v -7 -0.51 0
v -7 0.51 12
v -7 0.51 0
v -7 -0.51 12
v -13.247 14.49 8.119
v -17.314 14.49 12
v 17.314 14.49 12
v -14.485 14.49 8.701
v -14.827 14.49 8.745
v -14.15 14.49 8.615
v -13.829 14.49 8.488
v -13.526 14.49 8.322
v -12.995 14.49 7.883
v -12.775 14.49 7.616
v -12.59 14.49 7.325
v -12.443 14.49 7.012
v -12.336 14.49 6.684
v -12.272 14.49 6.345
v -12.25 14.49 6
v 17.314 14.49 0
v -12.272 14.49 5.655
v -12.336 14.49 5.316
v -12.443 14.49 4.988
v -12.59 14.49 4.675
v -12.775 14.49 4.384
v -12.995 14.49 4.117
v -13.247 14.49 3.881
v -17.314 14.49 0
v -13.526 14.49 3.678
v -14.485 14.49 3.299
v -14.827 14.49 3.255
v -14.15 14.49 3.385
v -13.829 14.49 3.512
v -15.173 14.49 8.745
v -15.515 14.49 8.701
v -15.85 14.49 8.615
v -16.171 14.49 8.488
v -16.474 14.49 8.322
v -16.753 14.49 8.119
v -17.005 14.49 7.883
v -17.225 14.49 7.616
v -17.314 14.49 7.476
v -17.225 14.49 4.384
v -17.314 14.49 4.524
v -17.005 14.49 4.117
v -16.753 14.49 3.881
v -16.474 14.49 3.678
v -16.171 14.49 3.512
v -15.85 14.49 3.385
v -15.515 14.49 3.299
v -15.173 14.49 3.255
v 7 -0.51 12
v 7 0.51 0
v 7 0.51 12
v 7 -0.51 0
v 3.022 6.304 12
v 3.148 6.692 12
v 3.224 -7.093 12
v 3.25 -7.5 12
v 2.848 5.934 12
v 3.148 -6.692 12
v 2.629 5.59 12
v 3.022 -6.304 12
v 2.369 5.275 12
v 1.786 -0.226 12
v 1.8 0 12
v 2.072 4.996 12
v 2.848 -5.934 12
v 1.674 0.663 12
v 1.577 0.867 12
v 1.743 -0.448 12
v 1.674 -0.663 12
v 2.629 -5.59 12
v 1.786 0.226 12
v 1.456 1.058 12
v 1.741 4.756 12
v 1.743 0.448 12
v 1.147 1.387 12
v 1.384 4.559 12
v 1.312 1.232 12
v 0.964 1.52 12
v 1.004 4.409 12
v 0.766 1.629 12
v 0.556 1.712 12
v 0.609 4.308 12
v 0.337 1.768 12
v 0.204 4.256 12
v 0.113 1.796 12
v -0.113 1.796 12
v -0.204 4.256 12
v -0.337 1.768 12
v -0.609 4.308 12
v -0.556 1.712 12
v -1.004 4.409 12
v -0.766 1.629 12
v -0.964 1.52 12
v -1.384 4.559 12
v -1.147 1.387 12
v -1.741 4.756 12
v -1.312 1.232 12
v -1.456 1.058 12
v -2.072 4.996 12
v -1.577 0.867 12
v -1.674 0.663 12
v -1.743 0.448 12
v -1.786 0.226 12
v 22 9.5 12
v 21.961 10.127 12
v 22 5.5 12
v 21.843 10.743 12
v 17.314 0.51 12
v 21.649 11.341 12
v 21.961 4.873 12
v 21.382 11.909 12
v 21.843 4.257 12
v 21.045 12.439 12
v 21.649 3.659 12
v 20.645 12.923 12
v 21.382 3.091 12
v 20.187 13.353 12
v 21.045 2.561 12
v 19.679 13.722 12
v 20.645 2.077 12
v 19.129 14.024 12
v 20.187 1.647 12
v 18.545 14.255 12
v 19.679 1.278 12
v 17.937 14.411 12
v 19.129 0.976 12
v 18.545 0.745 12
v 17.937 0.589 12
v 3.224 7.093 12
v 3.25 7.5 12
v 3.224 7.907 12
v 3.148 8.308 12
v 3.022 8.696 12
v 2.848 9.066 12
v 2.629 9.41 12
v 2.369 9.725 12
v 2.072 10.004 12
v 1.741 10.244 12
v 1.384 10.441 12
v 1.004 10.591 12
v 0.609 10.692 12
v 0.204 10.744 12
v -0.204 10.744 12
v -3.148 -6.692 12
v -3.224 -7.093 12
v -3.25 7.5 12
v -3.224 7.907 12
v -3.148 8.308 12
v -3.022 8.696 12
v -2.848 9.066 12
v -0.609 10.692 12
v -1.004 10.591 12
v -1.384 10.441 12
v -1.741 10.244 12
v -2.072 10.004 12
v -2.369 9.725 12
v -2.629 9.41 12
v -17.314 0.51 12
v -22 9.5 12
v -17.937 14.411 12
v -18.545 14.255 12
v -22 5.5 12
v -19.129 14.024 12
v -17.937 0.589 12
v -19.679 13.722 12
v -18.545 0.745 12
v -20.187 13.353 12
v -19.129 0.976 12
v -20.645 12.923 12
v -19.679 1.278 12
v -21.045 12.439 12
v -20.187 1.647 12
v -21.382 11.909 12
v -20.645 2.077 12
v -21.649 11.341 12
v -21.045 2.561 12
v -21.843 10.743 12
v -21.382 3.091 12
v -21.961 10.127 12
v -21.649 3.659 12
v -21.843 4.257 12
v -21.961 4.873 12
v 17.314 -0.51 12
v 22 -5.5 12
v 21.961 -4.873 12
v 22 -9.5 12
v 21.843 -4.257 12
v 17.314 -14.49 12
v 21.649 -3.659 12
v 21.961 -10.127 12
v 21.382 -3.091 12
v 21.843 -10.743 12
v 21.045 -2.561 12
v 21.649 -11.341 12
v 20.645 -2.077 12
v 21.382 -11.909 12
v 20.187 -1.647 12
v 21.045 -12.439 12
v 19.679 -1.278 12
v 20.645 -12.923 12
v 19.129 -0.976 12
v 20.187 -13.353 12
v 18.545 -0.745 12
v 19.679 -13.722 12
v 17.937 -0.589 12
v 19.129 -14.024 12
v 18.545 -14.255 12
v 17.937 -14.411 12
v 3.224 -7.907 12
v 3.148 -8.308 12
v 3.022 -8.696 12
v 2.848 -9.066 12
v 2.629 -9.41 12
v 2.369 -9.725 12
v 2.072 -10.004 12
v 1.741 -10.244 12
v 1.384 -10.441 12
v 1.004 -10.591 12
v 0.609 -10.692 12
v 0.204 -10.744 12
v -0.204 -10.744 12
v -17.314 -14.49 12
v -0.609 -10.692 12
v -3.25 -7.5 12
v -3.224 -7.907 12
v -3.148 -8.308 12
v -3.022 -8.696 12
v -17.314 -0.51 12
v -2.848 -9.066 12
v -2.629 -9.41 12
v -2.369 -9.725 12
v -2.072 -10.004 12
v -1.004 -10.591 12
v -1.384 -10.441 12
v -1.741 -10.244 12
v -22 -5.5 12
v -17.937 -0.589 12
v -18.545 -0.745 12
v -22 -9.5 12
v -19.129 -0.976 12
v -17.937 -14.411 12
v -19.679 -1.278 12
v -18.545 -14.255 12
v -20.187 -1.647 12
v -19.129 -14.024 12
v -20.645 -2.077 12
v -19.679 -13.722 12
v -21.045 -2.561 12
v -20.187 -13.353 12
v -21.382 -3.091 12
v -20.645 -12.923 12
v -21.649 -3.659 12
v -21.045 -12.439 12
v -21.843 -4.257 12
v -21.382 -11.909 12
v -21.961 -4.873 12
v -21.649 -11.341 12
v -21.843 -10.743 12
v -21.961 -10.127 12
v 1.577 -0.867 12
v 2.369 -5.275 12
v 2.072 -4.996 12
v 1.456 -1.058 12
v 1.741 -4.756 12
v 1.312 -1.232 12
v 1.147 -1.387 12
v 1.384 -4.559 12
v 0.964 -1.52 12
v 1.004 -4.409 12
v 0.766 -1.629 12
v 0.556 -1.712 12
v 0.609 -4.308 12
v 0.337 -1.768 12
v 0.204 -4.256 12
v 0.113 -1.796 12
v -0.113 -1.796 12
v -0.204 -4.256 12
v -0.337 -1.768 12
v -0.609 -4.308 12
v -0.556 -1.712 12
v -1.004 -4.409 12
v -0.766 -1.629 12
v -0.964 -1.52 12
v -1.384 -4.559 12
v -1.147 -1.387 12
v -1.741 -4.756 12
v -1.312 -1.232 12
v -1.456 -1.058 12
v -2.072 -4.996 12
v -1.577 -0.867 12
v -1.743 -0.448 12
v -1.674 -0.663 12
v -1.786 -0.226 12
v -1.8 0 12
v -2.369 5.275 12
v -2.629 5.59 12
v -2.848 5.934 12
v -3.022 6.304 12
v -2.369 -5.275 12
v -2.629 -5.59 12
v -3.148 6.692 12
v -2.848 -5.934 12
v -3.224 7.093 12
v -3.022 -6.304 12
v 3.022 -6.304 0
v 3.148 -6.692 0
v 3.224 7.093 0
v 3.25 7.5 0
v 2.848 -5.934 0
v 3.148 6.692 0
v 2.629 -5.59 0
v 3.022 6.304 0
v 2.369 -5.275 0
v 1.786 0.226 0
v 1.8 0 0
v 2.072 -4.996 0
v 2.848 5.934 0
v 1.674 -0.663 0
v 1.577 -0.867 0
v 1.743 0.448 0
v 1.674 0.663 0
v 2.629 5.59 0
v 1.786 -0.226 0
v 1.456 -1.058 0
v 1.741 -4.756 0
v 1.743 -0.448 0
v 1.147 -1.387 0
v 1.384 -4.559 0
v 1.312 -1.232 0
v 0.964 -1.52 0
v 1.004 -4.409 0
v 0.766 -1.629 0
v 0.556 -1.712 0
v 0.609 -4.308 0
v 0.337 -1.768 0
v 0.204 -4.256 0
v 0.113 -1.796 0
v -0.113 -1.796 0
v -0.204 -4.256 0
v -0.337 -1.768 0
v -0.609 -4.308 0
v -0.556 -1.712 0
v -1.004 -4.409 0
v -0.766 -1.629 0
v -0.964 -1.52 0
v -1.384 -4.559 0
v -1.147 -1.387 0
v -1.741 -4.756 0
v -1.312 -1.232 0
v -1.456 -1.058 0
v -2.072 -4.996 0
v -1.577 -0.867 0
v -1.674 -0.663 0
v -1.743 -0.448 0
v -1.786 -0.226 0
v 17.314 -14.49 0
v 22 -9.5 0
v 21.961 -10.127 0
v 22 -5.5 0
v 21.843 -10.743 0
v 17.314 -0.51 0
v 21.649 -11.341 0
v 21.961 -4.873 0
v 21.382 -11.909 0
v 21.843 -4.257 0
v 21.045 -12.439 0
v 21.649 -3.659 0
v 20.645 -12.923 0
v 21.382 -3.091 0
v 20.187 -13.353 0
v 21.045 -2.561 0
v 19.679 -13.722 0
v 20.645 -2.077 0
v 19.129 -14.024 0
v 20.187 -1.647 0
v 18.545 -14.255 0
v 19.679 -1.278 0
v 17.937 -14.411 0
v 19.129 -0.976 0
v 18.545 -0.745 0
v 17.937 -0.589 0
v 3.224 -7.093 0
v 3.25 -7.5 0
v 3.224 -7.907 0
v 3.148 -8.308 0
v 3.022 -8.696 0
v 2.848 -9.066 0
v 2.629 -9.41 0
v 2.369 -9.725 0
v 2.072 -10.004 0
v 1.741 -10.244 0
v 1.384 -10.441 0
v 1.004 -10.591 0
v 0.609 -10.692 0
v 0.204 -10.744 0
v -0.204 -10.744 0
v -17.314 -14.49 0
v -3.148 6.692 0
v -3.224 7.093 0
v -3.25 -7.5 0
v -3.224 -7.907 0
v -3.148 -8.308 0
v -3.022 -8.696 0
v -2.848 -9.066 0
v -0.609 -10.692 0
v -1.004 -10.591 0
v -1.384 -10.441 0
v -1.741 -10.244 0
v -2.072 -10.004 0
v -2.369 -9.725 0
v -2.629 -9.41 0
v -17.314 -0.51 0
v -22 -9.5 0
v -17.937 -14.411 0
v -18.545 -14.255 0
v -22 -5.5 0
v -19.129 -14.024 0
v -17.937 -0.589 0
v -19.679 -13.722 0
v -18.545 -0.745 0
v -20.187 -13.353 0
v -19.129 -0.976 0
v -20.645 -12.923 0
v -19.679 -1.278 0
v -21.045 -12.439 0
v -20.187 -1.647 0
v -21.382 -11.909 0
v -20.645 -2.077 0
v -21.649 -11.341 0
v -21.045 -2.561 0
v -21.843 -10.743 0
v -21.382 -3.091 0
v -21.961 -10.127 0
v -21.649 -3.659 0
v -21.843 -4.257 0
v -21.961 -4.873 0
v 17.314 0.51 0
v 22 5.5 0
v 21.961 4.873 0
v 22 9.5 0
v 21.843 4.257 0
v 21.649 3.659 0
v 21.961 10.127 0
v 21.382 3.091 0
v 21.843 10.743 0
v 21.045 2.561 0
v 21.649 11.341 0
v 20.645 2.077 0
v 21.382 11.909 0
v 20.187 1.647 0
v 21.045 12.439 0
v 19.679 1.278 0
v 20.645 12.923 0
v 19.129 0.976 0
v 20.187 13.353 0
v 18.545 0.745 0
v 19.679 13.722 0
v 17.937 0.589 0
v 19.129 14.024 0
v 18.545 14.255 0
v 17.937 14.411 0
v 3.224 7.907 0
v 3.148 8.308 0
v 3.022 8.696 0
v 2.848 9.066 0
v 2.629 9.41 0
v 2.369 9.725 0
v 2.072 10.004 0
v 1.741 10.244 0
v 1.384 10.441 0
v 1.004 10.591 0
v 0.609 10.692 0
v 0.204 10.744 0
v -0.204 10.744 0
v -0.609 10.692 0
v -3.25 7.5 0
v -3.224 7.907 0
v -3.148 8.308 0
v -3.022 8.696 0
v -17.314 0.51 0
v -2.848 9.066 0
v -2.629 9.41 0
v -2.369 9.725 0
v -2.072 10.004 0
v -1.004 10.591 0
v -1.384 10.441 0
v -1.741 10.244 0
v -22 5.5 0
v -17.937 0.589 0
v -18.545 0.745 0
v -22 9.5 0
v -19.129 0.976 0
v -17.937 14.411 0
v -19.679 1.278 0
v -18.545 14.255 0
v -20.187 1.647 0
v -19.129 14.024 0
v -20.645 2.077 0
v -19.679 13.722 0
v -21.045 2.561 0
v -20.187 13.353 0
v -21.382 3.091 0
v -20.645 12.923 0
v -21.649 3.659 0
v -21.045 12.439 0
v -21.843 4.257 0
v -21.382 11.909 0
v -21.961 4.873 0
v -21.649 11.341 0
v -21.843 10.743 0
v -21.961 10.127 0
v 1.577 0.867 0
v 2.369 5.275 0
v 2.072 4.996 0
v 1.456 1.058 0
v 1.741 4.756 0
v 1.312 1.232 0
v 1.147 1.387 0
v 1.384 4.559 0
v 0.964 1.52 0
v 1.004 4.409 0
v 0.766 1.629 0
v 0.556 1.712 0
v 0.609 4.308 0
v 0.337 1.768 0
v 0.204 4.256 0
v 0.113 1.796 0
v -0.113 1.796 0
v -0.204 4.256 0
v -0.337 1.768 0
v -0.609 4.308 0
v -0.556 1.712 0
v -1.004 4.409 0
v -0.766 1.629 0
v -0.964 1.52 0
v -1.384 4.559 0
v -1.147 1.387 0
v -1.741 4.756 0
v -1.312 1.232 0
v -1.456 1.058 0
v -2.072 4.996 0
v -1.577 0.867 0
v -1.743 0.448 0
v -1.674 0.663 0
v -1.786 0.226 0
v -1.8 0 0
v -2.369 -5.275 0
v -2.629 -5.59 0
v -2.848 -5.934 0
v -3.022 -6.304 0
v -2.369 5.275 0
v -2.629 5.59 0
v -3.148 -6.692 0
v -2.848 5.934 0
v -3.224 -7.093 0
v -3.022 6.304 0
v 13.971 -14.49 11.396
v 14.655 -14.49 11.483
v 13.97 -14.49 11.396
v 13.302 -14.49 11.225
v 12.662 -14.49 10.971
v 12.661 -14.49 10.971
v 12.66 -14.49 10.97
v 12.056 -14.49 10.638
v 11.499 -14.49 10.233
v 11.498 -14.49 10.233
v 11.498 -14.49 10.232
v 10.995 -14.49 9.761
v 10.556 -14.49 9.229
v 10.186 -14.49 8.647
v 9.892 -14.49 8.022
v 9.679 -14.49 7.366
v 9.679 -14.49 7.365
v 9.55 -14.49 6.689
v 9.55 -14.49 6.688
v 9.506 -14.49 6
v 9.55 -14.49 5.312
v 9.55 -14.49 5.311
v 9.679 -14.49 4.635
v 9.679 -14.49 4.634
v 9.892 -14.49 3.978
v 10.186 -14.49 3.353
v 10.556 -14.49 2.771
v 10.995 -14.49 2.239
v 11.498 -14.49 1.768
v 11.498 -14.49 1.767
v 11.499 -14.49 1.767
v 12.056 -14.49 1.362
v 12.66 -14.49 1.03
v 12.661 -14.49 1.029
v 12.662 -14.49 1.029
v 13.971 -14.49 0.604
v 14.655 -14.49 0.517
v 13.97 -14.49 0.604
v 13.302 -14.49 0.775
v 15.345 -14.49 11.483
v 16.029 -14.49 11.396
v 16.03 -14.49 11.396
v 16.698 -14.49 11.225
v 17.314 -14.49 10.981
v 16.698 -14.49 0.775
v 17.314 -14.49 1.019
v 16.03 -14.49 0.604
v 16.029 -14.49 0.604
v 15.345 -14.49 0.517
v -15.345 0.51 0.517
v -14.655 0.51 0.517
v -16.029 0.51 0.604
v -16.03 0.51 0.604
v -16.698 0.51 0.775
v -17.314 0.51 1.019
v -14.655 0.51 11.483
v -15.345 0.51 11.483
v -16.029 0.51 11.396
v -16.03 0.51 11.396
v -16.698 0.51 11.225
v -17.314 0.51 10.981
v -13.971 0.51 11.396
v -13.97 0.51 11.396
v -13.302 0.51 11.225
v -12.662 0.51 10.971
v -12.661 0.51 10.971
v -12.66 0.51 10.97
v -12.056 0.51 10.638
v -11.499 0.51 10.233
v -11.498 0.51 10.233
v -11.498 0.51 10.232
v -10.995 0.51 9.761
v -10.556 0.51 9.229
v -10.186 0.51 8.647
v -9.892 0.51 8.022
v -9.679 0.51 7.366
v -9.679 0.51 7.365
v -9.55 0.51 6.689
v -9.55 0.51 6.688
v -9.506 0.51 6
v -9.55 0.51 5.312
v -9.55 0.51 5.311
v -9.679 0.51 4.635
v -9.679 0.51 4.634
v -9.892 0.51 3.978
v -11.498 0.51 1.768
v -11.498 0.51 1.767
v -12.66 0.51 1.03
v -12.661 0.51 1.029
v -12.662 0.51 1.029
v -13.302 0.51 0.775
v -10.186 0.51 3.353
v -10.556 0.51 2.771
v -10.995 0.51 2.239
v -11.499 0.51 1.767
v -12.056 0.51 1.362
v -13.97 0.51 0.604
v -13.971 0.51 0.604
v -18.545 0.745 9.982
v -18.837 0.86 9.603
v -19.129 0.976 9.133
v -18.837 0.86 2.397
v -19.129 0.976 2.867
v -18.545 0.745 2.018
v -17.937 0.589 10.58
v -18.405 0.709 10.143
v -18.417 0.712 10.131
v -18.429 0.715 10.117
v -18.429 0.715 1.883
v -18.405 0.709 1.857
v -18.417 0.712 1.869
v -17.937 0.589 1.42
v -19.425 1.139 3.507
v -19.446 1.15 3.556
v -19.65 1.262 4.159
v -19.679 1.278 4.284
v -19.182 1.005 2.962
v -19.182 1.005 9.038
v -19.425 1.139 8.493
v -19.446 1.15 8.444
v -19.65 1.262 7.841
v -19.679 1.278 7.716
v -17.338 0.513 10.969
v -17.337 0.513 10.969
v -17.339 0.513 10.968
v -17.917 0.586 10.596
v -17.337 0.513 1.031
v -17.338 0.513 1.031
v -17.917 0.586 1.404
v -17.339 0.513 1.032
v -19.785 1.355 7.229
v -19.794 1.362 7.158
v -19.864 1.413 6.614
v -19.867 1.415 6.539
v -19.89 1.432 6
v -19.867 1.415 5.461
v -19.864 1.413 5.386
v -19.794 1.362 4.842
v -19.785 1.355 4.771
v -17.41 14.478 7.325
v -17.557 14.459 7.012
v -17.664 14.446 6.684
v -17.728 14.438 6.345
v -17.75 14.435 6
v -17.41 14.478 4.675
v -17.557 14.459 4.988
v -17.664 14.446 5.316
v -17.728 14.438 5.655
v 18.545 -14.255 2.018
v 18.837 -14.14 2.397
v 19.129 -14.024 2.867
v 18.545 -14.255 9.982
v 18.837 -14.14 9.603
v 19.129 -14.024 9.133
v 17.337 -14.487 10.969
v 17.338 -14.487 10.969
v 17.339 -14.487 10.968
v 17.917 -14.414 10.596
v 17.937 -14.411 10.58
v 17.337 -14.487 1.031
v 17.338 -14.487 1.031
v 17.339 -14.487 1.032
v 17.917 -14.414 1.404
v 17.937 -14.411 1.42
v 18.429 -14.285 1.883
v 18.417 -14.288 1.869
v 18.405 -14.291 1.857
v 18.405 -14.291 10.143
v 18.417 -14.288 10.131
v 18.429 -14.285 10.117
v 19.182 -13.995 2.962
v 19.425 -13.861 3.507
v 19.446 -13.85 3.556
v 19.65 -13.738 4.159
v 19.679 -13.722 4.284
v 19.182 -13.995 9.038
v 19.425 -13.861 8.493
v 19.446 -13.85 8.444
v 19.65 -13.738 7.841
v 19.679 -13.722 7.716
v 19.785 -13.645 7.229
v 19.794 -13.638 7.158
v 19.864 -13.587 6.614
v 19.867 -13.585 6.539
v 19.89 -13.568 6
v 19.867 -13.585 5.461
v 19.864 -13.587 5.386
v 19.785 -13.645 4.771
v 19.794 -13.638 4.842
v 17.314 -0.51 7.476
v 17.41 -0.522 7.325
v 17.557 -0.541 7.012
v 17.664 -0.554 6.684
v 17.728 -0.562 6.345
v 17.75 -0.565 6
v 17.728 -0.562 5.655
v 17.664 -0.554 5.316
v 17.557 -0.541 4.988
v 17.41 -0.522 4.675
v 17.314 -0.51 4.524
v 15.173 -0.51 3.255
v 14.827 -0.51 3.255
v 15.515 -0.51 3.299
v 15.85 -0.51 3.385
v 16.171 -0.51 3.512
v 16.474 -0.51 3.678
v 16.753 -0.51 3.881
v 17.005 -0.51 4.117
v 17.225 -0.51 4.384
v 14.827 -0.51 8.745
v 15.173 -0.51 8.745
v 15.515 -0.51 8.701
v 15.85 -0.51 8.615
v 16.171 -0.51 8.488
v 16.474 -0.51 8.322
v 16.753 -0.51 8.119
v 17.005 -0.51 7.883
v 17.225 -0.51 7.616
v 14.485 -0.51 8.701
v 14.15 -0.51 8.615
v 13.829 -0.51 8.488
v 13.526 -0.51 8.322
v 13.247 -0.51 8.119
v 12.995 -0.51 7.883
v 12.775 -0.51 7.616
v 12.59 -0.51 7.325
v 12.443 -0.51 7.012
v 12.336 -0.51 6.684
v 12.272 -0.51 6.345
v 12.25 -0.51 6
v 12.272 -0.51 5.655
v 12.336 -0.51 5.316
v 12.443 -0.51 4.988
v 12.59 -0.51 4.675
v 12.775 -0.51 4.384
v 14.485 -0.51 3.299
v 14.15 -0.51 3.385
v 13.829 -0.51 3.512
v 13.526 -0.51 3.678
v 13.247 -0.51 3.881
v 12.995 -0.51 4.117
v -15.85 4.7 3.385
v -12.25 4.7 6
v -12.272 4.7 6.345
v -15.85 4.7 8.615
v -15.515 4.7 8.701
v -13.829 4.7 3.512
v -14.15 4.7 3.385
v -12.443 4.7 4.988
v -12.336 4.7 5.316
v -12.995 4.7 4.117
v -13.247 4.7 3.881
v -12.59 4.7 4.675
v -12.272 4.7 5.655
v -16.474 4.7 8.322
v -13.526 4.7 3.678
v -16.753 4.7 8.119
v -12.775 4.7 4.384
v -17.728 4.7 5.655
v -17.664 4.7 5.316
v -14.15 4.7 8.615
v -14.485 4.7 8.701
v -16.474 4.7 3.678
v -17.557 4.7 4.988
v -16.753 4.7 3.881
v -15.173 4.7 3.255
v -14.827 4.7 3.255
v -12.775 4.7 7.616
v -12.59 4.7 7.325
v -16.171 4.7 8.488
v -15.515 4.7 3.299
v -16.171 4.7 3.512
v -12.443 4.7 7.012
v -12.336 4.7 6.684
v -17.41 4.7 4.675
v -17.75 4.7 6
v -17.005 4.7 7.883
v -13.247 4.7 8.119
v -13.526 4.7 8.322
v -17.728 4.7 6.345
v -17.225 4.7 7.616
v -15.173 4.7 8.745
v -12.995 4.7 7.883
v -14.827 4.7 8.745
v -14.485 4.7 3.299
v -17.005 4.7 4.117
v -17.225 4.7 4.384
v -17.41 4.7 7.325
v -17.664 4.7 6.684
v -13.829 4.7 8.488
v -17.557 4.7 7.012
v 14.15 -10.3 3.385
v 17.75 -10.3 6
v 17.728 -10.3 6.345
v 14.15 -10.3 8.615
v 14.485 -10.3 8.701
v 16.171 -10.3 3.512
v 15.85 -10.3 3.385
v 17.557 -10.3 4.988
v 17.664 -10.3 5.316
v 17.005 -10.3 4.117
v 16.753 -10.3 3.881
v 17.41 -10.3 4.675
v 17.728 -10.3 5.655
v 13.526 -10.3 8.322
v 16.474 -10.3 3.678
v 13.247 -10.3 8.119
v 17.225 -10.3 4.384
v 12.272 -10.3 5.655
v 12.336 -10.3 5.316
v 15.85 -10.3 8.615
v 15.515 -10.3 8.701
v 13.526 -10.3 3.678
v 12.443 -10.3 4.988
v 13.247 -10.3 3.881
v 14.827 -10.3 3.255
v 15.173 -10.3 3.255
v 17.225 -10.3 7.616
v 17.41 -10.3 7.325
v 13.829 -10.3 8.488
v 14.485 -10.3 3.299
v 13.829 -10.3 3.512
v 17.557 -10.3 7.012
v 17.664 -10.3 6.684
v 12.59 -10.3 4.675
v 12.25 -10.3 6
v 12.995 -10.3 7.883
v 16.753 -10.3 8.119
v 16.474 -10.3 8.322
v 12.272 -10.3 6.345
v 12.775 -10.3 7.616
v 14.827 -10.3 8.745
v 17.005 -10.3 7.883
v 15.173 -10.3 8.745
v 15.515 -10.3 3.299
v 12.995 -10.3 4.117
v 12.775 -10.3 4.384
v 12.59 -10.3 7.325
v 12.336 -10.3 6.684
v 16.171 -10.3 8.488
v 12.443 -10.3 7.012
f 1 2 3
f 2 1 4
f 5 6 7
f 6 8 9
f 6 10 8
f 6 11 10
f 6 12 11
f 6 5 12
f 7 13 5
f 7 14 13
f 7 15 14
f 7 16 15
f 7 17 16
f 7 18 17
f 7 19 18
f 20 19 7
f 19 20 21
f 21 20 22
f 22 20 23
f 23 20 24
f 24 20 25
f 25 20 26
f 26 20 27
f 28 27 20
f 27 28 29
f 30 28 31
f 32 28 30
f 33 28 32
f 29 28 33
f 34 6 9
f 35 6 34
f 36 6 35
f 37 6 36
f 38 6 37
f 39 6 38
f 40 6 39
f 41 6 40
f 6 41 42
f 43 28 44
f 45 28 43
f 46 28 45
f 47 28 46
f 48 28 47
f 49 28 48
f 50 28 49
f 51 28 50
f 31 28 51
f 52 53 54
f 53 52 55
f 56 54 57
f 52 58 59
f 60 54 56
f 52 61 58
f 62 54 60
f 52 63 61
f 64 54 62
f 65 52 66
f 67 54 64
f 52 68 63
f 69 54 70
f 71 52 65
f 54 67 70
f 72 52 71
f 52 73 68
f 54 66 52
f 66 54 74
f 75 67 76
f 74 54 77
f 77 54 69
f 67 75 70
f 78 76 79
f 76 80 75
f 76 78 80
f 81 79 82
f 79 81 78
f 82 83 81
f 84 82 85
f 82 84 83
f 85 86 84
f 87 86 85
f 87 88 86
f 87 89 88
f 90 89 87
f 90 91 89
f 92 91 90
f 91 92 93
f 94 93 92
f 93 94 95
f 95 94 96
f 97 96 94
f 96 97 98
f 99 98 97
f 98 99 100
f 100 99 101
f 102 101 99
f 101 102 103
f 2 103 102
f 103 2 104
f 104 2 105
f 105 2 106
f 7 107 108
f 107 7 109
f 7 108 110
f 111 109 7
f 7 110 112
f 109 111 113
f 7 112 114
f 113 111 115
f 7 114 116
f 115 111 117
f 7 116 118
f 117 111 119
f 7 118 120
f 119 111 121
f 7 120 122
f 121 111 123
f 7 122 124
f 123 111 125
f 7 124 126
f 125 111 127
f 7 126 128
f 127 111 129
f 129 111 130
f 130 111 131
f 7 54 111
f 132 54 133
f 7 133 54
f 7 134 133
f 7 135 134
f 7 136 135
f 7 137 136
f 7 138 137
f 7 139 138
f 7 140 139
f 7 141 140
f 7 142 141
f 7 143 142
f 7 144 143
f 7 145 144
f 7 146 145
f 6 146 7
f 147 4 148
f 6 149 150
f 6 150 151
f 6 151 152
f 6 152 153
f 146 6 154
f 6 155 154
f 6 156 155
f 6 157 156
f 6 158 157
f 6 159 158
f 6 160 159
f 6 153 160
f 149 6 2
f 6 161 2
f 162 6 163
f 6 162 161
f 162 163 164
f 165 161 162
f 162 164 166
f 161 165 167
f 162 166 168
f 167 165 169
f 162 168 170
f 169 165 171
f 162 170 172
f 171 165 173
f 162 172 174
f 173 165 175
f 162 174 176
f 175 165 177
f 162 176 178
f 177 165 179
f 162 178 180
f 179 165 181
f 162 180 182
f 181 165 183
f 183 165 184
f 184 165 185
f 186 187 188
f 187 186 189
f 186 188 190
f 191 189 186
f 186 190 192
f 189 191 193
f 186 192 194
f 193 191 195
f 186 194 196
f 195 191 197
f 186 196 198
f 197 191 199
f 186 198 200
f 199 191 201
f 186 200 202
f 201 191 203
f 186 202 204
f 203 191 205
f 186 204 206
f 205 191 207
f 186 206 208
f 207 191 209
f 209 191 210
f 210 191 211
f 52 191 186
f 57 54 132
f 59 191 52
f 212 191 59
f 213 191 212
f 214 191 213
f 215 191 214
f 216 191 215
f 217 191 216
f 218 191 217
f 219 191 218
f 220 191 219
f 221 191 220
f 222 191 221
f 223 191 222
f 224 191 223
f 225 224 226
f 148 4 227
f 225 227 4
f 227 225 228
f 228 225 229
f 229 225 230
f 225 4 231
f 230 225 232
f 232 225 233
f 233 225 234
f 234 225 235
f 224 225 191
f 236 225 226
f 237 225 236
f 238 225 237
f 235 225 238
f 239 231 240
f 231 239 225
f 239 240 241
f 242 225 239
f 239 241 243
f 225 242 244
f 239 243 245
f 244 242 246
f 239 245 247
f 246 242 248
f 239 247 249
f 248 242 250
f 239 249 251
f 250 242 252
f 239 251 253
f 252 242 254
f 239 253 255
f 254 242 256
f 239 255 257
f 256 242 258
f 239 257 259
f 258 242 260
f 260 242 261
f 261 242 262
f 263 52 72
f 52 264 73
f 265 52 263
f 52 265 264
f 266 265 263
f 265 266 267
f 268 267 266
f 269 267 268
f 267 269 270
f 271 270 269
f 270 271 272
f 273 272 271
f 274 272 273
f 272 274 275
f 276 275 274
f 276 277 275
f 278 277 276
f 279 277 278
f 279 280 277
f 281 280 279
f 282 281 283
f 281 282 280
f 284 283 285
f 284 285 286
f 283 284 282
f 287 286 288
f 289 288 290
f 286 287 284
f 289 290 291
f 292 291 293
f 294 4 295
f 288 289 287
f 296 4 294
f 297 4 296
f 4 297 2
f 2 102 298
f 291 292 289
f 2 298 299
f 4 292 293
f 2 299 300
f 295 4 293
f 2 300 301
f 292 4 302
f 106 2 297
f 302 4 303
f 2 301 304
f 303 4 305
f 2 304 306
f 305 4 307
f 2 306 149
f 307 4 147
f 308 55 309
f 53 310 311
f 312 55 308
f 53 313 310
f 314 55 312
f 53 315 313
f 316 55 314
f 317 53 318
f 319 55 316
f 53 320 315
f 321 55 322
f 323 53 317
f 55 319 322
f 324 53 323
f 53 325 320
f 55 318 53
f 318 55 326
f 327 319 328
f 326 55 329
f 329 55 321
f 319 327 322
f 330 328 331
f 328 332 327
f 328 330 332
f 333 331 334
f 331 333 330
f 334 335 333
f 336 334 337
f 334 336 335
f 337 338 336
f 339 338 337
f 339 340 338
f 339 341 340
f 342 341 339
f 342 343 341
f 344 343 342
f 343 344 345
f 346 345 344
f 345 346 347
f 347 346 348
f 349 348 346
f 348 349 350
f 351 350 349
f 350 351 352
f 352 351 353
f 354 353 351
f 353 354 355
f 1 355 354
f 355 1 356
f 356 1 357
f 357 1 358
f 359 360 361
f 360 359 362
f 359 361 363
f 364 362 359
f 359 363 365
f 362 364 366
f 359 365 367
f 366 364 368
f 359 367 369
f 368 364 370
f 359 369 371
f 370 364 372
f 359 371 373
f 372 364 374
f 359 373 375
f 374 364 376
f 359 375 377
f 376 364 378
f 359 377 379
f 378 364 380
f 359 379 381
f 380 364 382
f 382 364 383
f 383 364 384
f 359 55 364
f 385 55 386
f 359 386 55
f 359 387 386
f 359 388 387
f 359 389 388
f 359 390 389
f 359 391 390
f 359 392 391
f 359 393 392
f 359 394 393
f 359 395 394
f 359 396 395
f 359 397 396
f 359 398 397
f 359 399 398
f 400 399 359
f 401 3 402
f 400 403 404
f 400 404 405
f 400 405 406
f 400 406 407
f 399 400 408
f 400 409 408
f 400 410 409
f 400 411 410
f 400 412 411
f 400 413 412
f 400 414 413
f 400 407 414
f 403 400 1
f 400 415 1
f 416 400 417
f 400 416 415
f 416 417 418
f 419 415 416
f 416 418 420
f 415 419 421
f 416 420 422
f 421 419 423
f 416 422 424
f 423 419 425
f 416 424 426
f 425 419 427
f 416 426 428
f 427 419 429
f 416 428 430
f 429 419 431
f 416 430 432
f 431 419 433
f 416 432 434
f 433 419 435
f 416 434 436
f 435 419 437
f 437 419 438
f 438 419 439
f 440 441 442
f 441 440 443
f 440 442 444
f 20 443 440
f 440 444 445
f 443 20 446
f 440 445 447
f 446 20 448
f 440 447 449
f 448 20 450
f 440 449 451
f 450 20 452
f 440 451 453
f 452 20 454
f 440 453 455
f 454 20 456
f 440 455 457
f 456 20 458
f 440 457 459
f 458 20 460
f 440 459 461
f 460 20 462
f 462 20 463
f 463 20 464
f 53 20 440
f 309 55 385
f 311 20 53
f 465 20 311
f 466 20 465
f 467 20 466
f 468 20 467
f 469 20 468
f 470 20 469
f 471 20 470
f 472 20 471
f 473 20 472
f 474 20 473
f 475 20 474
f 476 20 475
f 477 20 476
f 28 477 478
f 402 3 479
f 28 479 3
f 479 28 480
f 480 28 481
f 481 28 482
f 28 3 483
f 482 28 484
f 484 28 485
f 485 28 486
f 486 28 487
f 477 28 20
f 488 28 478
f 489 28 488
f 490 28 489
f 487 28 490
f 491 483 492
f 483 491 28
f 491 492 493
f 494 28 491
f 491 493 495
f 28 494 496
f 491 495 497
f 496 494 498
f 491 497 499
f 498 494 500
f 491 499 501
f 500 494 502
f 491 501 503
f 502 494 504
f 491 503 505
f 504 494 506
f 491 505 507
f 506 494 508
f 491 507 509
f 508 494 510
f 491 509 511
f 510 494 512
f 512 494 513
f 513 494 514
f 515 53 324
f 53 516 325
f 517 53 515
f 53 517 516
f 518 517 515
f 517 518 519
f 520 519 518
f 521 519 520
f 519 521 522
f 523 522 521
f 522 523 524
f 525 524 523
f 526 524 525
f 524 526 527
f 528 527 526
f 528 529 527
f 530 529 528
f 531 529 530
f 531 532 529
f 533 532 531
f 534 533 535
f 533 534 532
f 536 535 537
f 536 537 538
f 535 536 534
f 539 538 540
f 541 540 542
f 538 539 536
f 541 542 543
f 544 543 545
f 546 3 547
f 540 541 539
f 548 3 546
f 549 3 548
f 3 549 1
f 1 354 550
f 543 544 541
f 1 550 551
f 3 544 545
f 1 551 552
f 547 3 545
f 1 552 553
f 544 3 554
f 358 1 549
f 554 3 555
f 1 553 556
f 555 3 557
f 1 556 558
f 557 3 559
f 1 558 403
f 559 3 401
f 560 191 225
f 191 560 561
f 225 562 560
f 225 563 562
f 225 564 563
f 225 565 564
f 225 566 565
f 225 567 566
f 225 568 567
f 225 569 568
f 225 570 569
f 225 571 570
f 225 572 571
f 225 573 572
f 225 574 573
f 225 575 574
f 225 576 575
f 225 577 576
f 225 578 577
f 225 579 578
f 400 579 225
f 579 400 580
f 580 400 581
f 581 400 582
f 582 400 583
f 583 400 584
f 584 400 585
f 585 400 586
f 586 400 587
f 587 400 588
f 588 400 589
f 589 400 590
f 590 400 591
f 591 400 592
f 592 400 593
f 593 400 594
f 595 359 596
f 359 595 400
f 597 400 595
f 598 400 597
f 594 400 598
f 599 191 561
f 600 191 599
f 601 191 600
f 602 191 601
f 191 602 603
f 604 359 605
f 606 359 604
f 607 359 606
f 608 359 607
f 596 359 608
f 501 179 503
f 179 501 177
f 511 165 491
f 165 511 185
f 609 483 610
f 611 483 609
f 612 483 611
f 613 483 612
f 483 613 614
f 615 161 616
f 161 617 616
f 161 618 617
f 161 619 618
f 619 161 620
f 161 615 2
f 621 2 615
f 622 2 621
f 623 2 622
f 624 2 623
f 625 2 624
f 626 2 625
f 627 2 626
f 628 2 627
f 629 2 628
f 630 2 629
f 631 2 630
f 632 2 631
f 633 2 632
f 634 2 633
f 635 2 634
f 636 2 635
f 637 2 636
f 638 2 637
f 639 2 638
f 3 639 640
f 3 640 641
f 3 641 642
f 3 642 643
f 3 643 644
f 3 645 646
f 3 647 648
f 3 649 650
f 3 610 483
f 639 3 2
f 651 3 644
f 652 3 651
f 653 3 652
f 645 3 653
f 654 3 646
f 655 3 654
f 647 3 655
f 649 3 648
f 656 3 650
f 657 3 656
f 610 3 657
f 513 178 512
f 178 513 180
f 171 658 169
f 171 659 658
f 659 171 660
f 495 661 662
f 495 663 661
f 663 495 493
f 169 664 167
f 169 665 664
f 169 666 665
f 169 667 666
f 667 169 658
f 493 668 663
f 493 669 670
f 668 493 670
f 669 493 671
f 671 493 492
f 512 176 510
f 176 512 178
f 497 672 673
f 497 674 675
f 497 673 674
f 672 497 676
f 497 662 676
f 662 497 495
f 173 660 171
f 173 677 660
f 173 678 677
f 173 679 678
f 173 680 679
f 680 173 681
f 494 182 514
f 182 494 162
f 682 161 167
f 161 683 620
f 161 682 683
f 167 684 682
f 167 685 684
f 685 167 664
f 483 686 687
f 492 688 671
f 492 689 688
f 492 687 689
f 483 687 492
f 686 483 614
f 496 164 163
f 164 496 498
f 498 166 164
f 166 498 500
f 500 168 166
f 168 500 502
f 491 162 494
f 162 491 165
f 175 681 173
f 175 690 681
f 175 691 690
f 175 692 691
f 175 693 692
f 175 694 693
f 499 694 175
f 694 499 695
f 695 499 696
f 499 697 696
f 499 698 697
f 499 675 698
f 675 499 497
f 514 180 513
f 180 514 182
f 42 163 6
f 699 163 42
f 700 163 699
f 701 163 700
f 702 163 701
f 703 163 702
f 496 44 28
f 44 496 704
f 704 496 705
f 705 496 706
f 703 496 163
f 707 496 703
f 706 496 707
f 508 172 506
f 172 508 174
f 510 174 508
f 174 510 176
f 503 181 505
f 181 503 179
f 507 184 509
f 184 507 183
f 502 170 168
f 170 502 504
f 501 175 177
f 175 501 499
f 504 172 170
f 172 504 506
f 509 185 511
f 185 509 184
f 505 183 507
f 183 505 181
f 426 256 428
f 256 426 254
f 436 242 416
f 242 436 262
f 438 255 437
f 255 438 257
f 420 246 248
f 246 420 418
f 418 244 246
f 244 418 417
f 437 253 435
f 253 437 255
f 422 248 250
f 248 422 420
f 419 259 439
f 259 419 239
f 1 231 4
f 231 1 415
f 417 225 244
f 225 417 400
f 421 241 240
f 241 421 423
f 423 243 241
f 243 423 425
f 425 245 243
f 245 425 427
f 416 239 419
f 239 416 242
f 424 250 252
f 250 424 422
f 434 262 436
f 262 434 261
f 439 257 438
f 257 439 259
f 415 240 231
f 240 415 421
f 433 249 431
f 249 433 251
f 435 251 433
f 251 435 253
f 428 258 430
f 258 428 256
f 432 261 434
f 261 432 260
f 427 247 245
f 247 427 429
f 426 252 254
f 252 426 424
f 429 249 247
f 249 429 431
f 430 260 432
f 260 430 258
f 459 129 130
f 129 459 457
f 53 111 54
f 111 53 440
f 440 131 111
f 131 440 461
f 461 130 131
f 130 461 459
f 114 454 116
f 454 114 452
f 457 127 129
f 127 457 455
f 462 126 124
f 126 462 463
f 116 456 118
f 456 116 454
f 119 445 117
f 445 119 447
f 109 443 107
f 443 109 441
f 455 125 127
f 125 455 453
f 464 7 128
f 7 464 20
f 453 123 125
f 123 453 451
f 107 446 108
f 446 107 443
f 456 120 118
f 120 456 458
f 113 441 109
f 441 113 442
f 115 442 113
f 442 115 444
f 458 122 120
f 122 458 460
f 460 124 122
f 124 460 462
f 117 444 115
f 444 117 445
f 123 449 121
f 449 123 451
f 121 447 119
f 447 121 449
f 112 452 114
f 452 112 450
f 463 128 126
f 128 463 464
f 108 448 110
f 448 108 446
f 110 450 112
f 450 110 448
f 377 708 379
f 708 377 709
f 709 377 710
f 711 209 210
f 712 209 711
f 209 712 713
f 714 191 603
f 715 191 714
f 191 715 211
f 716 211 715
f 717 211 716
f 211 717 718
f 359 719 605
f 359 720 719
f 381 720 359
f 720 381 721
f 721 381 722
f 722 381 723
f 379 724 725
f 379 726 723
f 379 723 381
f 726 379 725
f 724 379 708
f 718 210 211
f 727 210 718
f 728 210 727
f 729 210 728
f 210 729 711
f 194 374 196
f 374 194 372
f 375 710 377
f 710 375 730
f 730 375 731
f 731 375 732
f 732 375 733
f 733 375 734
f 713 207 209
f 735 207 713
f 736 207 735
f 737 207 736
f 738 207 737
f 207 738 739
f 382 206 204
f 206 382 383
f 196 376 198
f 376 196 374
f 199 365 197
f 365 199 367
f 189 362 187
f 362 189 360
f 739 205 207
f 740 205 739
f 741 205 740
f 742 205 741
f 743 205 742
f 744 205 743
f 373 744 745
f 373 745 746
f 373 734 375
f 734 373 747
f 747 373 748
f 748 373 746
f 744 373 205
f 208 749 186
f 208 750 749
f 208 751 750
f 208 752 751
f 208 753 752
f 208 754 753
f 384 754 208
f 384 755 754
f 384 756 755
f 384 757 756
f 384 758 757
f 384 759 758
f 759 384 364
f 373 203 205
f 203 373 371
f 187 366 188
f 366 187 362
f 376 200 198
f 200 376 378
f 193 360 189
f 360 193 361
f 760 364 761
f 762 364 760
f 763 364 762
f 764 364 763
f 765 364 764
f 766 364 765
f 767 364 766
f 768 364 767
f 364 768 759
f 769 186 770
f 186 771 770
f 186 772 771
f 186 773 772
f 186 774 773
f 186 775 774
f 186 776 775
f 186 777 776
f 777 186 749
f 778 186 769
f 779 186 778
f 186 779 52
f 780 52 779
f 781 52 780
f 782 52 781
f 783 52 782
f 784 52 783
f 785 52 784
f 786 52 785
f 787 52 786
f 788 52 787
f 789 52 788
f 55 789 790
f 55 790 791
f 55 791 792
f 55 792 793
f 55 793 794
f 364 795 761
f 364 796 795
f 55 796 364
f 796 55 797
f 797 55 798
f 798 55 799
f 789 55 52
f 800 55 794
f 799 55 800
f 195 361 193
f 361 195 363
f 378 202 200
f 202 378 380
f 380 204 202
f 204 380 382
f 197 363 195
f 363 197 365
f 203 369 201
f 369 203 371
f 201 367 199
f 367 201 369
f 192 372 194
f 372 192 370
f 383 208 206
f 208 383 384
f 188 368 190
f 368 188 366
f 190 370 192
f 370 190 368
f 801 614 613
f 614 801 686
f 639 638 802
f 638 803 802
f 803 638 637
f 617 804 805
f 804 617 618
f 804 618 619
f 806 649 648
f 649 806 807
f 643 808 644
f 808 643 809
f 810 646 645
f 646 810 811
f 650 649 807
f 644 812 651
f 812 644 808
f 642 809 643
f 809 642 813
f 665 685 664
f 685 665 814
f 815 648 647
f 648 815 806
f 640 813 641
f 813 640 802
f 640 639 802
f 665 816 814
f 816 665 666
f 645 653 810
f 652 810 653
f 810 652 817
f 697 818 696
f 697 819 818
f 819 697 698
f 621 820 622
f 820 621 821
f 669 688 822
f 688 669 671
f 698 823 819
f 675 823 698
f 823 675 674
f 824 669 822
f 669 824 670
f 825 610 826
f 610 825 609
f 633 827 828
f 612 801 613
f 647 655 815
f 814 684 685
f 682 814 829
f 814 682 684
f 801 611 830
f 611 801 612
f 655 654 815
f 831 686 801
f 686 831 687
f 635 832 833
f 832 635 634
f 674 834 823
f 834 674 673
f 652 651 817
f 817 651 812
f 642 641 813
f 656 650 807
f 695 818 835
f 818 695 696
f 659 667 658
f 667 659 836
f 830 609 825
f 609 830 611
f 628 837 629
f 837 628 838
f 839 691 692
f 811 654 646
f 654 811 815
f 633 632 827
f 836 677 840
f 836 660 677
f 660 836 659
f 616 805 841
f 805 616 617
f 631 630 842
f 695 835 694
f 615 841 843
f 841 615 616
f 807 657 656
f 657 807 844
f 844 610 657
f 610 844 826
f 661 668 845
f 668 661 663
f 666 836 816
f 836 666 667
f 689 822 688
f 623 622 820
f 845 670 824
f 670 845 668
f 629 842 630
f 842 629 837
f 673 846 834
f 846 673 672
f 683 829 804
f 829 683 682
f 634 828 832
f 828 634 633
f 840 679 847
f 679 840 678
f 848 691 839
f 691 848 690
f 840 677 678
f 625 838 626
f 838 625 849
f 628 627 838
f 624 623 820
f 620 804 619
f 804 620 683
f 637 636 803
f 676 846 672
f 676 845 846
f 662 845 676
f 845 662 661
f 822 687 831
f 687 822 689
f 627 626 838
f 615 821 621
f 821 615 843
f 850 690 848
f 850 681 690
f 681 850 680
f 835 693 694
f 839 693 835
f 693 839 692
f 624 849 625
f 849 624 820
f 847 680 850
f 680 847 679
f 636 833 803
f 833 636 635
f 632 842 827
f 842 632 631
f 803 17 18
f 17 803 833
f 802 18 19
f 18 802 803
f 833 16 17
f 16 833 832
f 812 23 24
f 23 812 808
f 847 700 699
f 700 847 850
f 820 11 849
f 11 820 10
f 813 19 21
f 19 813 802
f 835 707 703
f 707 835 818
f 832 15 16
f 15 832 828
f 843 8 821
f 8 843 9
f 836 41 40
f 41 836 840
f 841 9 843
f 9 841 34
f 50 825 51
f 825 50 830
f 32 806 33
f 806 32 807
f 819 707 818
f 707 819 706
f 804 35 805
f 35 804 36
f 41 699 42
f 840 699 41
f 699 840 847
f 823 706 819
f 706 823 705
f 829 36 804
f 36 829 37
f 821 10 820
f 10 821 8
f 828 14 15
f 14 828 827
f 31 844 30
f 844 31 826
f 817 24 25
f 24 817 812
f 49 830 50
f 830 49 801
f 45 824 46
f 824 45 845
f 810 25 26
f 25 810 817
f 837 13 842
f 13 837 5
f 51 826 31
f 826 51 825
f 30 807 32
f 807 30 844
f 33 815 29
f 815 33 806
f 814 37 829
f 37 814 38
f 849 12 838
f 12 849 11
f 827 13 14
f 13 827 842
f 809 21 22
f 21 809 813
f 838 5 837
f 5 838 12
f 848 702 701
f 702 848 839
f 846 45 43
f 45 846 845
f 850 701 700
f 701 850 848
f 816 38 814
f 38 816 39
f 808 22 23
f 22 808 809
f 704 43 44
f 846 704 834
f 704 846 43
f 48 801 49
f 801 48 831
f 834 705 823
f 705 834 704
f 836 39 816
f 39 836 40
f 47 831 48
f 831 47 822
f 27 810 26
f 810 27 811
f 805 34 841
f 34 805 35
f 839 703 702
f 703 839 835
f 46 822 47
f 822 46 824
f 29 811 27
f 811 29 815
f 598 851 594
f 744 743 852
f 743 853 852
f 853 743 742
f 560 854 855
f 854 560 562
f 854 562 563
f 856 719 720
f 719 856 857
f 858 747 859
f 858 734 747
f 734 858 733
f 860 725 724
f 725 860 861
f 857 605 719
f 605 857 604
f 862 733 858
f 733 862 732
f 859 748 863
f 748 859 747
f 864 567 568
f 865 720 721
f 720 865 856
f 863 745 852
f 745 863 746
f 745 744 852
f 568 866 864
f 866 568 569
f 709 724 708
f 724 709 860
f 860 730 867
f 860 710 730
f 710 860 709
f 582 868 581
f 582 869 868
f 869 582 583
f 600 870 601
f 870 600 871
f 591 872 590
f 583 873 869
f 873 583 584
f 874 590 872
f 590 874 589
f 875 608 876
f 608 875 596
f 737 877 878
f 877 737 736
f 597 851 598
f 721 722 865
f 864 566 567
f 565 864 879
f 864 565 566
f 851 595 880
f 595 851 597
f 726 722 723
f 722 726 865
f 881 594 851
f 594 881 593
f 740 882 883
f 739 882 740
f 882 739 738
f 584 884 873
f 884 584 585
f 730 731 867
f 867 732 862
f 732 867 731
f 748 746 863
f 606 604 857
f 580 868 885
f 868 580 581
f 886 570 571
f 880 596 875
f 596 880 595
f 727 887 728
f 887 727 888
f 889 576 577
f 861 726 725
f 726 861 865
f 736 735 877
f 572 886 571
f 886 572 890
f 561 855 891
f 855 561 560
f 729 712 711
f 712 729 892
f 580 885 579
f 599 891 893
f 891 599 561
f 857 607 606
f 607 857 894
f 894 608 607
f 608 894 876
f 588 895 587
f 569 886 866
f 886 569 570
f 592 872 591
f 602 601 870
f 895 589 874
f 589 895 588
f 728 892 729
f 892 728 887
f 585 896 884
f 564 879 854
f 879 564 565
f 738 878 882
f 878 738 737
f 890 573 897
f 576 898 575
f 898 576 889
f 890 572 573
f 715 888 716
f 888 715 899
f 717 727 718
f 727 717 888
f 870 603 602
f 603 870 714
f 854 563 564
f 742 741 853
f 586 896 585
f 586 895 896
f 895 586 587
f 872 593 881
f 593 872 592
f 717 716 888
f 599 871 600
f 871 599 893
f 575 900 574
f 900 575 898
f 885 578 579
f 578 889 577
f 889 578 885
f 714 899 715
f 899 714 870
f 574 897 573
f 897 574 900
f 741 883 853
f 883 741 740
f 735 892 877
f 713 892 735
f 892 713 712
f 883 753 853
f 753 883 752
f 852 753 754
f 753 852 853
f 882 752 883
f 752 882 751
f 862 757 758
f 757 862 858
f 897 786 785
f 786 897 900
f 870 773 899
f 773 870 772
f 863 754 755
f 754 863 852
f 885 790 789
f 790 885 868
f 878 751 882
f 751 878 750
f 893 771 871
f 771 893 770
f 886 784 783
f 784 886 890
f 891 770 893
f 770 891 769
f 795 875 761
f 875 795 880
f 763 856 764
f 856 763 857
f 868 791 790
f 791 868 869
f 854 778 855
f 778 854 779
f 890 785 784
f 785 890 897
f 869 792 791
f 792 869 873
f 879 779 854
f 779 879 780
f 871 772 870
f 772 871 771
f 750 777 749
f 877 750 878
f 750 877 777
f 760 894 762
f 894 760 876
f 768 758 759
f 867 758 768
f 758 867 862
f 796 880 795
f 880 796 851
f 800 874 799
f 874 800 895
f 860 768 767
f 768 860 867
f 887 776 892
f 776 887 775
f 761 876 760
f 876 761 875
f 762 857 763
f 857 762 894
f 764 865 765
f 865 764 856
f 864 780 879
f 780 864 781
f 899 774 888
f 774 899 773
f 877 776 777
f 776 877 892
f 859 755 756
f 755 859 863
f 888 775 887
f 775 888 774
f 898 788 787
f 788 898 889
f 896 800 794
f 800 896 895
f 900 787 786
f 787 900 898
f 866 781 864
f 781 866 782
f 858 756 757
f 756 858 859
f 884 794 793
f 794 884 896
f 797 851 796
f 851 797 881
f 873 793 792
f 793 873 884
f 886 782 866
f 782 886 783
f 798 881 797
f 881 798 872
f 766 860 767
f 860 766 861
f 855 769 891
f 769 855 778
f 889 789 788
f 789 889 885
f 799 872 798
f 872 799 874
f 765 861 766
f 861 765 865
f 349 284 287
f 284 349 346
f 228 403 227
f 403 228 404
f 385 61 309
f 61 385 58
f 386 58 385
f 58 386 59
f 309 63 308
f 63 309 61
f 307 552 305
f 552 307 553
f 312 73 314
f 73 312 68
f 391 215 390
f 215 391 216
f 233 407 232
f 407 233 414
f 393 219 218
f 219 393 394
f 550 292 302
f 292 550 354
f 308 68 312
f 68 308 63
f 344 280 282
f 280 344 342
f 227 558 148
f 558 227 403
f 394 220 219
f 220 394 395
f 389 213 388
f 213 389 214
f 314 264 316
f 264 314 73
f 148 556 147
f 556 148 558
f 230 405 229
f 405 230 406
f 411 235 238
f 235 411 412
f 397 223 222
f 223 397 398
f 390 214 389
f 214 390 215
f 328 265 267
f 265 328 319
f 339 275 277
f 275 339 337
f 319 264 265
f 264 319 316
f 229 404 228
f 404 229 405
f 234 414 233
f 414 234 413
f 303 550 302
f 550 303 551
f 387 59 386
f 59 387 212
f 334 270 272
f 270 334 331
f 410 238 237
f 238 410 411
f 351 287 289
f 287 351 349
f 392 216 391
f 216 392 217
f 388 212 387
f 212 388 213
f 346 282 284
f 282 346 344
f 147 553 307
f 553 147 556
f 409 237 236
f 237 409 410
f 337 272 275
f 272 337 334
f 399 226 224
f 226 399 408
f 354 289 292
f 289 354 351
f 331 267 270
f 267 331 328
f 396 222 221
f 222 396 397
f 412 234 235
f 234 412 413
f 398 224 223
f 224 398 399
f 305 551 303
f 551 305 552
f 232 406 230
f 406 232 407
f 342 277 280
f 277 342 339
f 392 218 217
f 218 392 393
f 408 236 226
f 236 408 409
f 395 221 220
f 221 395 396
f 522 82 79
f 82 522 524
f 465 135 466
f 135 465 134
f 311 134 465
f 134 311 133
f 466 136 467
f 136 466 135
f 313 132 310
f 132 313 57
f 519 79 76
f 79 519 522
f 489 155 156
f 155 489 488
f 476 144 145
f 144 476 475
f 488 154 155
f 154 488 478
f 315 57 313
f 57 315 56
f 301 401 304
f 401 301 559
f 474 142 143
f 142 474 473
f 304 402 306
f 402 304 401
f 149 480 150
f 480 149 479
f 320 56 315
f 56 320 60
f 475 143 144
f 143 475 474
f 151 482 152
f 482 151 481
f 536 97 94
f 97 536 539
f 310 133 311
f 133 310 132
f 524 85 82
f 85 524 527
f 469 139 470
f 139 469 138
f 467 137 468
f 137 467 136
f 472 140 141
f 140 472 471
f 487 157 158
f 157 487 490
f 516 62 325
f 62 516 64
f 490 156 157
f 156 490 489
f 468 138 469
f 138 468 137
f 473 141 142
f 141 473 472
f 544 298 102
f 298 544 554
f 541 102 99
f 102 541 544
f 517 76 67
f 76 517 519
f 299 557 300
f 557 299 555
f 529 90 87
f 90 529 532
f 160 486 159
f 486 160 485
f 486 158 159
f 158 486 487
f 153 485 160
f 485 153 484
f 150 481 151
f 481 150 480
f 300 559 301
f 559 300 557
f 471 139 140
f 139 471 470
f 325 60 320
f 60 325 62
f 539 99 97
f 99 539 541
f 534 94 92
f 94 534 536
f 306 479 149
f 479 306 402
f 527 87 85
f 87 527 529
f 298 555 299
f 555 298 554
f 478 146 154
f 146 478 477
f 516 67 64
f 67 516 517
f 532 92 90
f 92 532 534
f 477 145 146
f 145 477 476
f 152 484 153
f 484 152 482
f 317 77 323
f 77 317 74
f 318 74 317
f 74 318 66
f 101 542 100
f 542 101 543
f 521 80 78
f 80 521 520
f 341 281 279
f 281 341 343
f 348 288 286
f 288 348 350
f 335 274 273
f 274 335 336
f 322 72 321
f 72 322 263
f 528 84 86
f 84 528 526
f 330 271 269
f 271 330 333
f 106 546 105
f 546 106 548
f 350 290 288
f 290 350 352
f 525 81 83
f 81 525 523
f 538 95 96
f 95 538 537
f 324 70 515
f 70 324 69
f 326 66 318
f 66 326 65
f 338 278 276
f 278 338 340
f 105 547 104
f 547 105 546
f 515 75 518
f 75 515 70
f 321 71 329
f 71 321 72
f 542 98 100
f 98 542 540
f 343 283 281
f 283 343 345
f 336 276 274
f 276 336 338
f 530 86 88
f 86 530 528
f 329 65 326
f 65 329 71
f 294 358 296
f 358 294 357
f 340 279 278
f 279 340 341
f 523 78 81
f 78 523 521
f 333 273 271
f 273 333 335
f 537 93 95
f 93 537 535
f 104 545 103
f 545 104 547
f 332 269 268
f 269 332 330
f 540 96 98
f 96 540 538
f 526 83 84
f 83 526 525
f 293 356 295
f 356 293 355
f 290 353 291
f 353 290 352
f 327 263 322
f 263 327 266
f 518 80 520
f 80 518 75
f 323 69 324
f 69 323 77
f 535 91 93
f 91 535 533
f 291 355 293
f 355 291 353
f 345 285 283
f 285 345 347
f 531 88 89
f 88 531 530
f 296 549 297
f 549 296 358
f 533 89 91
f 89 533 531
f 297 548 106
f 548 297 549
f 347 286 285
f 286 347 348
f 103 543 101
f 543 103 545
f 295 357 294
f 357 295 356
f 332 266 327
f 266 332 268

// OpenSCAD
$fn = 50;


difference() {
	union() {
		hull() {
			translate(v = [-2.0000000000, 9.5000000000, 0]) {
				cylinder(h = 12, r = 5);
			}
			translate(v = [2.0000000000, 9.5000000000, 0]) {
				cylinder(h = 12, r = 5);
			}
			translate(v = [-2.0000000000, -9.5000000000, 0]) {
				cylinder(h = 12, r = 5);
			}
			translate(v = [2.0000000000, -9.5000000000, 0]) {
				cylinder(h = 12, r = 5);
			}
		}
		translate(v = [-7.5000000000, 7.5000000000, 0]) {
			hull() {
				translate(v = [-9.5000000000, 2.0000000000, 0]) {
					cylinder(h = 12, r = 5);
				}
				translate(v = [9.5000000000, 2.0000000000, 0]) {
					cylinder(h = 12, r = 5);
				}
				translate(v = [-9.5000000000, -2.0000000000, 0]) {
					cylinder(h = 12, r = 5);
				}
				translate(v = [9.5000000000, -2.0000000000, 0]) {
					cylinder(h = 12, r = 5);
				}
			}
		}
		translate(v = [-7.5000000000, -7.5000000000, 0]) {
			hull() {
				translate(v = [-9.5000000000, 2.0000000000, 0]) {
					cylinder(h = 12, r = 5);
				}
				translate(v = [9.5000000000, 2.0000000000, 0]) {
					cylinder(h = 12, r = 5);
				}
				translate(v = [-9.5000000000, -2.0000000000, 0]) {
					cylinder(h = 12, r = 5);
				}
				translate(v = [9.5000000000, -2.0000000000, 0]) {
					cylinder(h = 12, r = 5);
				}
			}
		}
		translate(v = [7.5000000000, 7.5000000000, 0]) {
			hull() {
				translate(v = [-9.5000000000, 2.0000000000, 0]) {
					cylinder(h = 12, r = 5);
				}
				translate(v = [9.5000000000, 2.0000000000, 0]) {
					cylinder(h = 12, r = 5);
				}
				translate(v = [-9.5000000000, -2.0000000000, 0]) {
					cylinder(h = 12, r = 5);
				}
				translate(v = [9.5000000000, -2.0000000000, 0]) {
					cylinder(h = 12, r = 5);
				}
			}
		}
		translate(v = [7.5000000000, -7.5000000000, 0]) {
			hull() {
				translate(v = [-9.5000000000, 2.0000000000, 0]) {
					cylinder(h = 12, r = 5);
				}
				translate(v = [9.5000000000, 2.0000000000, 0]) {
					cylinder(h = 12, r = 5);
				}
				translate(v = [-9.5000000000, -2.0000000000, 0]) {
					cylinder(h = 12, r = 5);
				}
				translate(v = [9.5000000000, -2.0000000000, 0]) {
					cylinder(h = 12, r = 5);
				}
			}
		}
	}
	union() {
		translate(v = [-15.0000000000, 0.5000000000, 6.0000000000]) {
			rotate(a = [90, 0, 0]) {
				difference() {
					union() {
						#translate(v = [0, 0, -14.0000000000]) {
							cylinder(h = 14, r = 2.2500000000);
						}
						#translate(v = [0, 0, -4.2000000000]) {
							cylinder(h = 4.2000000000, r1 = 2.7500000000, r2 = 5.5000000000);
						}
						#translate(v = [0, 0, -14.0000000000]) {
							cylinder(h = 14, r = 2.7500000000);
						}
						#translate(v = [0, 0, -14.0000000000]) {
							cylinder(h = 14, r = 2.2500000000);
						}
					}
					union();
				}
			}
		}
		translate(v = [15.0000000000, -14.5000000000, 6.0000000000]) {
			rotate(a = [90, 0, 0]) {
				difference() {
					union() {
						#translate(v = [0, 0, -14.0000000000]) {
							cylinder(h = 14, r = 2.2500000000);
						}
						#translate(v = [0, 0, -4.2000000000]) {
							cylinder(h = 4.2000000000, r1 = 2.7500000000, r2 = 5.5000000000);
						}
						#translate(v = [0, 0, -14.0000000000]) {
							cylinder(h = 14, r = 2.7500000000);
						}
						#translate(v = [0, 0, -14.0000000000]) {
							cylinder(h = 14, r = 2.2500000000);
						}
					}
					union();
				}
			}
		}
		translate(v = [0.0000000000, -7.5000000000, 0]) {
			translate(v = [0, 0, -100]) {
				cylinder(h = 200, r = 3.2500000000);
			}
		}
		translate(v = [0.0000000000, 7.5000000000, 0]) {
			translate(v = [0, 0, -100]) {
				cylinder(h = 200, r = 3.2500000000);
			}
		}
		translate(v = [0.0000000000, -7.5000000000, 0]) {
			translate(v = [0, 0, -100]) {
				cylinder(h = 200, r = 1.8000000000);
			}
		}
		translate(v = [0, 0, -100]) {
			cylinder(h = 200, r = 1.8000000000);
		}
		translate(v = [0.0000000000, 7.5000000000, 0]) {
			translate(v = [0, 0, -100]) {
				cylinder(h = 200, r = 1.8000000000);
			}
		}
	}
}
